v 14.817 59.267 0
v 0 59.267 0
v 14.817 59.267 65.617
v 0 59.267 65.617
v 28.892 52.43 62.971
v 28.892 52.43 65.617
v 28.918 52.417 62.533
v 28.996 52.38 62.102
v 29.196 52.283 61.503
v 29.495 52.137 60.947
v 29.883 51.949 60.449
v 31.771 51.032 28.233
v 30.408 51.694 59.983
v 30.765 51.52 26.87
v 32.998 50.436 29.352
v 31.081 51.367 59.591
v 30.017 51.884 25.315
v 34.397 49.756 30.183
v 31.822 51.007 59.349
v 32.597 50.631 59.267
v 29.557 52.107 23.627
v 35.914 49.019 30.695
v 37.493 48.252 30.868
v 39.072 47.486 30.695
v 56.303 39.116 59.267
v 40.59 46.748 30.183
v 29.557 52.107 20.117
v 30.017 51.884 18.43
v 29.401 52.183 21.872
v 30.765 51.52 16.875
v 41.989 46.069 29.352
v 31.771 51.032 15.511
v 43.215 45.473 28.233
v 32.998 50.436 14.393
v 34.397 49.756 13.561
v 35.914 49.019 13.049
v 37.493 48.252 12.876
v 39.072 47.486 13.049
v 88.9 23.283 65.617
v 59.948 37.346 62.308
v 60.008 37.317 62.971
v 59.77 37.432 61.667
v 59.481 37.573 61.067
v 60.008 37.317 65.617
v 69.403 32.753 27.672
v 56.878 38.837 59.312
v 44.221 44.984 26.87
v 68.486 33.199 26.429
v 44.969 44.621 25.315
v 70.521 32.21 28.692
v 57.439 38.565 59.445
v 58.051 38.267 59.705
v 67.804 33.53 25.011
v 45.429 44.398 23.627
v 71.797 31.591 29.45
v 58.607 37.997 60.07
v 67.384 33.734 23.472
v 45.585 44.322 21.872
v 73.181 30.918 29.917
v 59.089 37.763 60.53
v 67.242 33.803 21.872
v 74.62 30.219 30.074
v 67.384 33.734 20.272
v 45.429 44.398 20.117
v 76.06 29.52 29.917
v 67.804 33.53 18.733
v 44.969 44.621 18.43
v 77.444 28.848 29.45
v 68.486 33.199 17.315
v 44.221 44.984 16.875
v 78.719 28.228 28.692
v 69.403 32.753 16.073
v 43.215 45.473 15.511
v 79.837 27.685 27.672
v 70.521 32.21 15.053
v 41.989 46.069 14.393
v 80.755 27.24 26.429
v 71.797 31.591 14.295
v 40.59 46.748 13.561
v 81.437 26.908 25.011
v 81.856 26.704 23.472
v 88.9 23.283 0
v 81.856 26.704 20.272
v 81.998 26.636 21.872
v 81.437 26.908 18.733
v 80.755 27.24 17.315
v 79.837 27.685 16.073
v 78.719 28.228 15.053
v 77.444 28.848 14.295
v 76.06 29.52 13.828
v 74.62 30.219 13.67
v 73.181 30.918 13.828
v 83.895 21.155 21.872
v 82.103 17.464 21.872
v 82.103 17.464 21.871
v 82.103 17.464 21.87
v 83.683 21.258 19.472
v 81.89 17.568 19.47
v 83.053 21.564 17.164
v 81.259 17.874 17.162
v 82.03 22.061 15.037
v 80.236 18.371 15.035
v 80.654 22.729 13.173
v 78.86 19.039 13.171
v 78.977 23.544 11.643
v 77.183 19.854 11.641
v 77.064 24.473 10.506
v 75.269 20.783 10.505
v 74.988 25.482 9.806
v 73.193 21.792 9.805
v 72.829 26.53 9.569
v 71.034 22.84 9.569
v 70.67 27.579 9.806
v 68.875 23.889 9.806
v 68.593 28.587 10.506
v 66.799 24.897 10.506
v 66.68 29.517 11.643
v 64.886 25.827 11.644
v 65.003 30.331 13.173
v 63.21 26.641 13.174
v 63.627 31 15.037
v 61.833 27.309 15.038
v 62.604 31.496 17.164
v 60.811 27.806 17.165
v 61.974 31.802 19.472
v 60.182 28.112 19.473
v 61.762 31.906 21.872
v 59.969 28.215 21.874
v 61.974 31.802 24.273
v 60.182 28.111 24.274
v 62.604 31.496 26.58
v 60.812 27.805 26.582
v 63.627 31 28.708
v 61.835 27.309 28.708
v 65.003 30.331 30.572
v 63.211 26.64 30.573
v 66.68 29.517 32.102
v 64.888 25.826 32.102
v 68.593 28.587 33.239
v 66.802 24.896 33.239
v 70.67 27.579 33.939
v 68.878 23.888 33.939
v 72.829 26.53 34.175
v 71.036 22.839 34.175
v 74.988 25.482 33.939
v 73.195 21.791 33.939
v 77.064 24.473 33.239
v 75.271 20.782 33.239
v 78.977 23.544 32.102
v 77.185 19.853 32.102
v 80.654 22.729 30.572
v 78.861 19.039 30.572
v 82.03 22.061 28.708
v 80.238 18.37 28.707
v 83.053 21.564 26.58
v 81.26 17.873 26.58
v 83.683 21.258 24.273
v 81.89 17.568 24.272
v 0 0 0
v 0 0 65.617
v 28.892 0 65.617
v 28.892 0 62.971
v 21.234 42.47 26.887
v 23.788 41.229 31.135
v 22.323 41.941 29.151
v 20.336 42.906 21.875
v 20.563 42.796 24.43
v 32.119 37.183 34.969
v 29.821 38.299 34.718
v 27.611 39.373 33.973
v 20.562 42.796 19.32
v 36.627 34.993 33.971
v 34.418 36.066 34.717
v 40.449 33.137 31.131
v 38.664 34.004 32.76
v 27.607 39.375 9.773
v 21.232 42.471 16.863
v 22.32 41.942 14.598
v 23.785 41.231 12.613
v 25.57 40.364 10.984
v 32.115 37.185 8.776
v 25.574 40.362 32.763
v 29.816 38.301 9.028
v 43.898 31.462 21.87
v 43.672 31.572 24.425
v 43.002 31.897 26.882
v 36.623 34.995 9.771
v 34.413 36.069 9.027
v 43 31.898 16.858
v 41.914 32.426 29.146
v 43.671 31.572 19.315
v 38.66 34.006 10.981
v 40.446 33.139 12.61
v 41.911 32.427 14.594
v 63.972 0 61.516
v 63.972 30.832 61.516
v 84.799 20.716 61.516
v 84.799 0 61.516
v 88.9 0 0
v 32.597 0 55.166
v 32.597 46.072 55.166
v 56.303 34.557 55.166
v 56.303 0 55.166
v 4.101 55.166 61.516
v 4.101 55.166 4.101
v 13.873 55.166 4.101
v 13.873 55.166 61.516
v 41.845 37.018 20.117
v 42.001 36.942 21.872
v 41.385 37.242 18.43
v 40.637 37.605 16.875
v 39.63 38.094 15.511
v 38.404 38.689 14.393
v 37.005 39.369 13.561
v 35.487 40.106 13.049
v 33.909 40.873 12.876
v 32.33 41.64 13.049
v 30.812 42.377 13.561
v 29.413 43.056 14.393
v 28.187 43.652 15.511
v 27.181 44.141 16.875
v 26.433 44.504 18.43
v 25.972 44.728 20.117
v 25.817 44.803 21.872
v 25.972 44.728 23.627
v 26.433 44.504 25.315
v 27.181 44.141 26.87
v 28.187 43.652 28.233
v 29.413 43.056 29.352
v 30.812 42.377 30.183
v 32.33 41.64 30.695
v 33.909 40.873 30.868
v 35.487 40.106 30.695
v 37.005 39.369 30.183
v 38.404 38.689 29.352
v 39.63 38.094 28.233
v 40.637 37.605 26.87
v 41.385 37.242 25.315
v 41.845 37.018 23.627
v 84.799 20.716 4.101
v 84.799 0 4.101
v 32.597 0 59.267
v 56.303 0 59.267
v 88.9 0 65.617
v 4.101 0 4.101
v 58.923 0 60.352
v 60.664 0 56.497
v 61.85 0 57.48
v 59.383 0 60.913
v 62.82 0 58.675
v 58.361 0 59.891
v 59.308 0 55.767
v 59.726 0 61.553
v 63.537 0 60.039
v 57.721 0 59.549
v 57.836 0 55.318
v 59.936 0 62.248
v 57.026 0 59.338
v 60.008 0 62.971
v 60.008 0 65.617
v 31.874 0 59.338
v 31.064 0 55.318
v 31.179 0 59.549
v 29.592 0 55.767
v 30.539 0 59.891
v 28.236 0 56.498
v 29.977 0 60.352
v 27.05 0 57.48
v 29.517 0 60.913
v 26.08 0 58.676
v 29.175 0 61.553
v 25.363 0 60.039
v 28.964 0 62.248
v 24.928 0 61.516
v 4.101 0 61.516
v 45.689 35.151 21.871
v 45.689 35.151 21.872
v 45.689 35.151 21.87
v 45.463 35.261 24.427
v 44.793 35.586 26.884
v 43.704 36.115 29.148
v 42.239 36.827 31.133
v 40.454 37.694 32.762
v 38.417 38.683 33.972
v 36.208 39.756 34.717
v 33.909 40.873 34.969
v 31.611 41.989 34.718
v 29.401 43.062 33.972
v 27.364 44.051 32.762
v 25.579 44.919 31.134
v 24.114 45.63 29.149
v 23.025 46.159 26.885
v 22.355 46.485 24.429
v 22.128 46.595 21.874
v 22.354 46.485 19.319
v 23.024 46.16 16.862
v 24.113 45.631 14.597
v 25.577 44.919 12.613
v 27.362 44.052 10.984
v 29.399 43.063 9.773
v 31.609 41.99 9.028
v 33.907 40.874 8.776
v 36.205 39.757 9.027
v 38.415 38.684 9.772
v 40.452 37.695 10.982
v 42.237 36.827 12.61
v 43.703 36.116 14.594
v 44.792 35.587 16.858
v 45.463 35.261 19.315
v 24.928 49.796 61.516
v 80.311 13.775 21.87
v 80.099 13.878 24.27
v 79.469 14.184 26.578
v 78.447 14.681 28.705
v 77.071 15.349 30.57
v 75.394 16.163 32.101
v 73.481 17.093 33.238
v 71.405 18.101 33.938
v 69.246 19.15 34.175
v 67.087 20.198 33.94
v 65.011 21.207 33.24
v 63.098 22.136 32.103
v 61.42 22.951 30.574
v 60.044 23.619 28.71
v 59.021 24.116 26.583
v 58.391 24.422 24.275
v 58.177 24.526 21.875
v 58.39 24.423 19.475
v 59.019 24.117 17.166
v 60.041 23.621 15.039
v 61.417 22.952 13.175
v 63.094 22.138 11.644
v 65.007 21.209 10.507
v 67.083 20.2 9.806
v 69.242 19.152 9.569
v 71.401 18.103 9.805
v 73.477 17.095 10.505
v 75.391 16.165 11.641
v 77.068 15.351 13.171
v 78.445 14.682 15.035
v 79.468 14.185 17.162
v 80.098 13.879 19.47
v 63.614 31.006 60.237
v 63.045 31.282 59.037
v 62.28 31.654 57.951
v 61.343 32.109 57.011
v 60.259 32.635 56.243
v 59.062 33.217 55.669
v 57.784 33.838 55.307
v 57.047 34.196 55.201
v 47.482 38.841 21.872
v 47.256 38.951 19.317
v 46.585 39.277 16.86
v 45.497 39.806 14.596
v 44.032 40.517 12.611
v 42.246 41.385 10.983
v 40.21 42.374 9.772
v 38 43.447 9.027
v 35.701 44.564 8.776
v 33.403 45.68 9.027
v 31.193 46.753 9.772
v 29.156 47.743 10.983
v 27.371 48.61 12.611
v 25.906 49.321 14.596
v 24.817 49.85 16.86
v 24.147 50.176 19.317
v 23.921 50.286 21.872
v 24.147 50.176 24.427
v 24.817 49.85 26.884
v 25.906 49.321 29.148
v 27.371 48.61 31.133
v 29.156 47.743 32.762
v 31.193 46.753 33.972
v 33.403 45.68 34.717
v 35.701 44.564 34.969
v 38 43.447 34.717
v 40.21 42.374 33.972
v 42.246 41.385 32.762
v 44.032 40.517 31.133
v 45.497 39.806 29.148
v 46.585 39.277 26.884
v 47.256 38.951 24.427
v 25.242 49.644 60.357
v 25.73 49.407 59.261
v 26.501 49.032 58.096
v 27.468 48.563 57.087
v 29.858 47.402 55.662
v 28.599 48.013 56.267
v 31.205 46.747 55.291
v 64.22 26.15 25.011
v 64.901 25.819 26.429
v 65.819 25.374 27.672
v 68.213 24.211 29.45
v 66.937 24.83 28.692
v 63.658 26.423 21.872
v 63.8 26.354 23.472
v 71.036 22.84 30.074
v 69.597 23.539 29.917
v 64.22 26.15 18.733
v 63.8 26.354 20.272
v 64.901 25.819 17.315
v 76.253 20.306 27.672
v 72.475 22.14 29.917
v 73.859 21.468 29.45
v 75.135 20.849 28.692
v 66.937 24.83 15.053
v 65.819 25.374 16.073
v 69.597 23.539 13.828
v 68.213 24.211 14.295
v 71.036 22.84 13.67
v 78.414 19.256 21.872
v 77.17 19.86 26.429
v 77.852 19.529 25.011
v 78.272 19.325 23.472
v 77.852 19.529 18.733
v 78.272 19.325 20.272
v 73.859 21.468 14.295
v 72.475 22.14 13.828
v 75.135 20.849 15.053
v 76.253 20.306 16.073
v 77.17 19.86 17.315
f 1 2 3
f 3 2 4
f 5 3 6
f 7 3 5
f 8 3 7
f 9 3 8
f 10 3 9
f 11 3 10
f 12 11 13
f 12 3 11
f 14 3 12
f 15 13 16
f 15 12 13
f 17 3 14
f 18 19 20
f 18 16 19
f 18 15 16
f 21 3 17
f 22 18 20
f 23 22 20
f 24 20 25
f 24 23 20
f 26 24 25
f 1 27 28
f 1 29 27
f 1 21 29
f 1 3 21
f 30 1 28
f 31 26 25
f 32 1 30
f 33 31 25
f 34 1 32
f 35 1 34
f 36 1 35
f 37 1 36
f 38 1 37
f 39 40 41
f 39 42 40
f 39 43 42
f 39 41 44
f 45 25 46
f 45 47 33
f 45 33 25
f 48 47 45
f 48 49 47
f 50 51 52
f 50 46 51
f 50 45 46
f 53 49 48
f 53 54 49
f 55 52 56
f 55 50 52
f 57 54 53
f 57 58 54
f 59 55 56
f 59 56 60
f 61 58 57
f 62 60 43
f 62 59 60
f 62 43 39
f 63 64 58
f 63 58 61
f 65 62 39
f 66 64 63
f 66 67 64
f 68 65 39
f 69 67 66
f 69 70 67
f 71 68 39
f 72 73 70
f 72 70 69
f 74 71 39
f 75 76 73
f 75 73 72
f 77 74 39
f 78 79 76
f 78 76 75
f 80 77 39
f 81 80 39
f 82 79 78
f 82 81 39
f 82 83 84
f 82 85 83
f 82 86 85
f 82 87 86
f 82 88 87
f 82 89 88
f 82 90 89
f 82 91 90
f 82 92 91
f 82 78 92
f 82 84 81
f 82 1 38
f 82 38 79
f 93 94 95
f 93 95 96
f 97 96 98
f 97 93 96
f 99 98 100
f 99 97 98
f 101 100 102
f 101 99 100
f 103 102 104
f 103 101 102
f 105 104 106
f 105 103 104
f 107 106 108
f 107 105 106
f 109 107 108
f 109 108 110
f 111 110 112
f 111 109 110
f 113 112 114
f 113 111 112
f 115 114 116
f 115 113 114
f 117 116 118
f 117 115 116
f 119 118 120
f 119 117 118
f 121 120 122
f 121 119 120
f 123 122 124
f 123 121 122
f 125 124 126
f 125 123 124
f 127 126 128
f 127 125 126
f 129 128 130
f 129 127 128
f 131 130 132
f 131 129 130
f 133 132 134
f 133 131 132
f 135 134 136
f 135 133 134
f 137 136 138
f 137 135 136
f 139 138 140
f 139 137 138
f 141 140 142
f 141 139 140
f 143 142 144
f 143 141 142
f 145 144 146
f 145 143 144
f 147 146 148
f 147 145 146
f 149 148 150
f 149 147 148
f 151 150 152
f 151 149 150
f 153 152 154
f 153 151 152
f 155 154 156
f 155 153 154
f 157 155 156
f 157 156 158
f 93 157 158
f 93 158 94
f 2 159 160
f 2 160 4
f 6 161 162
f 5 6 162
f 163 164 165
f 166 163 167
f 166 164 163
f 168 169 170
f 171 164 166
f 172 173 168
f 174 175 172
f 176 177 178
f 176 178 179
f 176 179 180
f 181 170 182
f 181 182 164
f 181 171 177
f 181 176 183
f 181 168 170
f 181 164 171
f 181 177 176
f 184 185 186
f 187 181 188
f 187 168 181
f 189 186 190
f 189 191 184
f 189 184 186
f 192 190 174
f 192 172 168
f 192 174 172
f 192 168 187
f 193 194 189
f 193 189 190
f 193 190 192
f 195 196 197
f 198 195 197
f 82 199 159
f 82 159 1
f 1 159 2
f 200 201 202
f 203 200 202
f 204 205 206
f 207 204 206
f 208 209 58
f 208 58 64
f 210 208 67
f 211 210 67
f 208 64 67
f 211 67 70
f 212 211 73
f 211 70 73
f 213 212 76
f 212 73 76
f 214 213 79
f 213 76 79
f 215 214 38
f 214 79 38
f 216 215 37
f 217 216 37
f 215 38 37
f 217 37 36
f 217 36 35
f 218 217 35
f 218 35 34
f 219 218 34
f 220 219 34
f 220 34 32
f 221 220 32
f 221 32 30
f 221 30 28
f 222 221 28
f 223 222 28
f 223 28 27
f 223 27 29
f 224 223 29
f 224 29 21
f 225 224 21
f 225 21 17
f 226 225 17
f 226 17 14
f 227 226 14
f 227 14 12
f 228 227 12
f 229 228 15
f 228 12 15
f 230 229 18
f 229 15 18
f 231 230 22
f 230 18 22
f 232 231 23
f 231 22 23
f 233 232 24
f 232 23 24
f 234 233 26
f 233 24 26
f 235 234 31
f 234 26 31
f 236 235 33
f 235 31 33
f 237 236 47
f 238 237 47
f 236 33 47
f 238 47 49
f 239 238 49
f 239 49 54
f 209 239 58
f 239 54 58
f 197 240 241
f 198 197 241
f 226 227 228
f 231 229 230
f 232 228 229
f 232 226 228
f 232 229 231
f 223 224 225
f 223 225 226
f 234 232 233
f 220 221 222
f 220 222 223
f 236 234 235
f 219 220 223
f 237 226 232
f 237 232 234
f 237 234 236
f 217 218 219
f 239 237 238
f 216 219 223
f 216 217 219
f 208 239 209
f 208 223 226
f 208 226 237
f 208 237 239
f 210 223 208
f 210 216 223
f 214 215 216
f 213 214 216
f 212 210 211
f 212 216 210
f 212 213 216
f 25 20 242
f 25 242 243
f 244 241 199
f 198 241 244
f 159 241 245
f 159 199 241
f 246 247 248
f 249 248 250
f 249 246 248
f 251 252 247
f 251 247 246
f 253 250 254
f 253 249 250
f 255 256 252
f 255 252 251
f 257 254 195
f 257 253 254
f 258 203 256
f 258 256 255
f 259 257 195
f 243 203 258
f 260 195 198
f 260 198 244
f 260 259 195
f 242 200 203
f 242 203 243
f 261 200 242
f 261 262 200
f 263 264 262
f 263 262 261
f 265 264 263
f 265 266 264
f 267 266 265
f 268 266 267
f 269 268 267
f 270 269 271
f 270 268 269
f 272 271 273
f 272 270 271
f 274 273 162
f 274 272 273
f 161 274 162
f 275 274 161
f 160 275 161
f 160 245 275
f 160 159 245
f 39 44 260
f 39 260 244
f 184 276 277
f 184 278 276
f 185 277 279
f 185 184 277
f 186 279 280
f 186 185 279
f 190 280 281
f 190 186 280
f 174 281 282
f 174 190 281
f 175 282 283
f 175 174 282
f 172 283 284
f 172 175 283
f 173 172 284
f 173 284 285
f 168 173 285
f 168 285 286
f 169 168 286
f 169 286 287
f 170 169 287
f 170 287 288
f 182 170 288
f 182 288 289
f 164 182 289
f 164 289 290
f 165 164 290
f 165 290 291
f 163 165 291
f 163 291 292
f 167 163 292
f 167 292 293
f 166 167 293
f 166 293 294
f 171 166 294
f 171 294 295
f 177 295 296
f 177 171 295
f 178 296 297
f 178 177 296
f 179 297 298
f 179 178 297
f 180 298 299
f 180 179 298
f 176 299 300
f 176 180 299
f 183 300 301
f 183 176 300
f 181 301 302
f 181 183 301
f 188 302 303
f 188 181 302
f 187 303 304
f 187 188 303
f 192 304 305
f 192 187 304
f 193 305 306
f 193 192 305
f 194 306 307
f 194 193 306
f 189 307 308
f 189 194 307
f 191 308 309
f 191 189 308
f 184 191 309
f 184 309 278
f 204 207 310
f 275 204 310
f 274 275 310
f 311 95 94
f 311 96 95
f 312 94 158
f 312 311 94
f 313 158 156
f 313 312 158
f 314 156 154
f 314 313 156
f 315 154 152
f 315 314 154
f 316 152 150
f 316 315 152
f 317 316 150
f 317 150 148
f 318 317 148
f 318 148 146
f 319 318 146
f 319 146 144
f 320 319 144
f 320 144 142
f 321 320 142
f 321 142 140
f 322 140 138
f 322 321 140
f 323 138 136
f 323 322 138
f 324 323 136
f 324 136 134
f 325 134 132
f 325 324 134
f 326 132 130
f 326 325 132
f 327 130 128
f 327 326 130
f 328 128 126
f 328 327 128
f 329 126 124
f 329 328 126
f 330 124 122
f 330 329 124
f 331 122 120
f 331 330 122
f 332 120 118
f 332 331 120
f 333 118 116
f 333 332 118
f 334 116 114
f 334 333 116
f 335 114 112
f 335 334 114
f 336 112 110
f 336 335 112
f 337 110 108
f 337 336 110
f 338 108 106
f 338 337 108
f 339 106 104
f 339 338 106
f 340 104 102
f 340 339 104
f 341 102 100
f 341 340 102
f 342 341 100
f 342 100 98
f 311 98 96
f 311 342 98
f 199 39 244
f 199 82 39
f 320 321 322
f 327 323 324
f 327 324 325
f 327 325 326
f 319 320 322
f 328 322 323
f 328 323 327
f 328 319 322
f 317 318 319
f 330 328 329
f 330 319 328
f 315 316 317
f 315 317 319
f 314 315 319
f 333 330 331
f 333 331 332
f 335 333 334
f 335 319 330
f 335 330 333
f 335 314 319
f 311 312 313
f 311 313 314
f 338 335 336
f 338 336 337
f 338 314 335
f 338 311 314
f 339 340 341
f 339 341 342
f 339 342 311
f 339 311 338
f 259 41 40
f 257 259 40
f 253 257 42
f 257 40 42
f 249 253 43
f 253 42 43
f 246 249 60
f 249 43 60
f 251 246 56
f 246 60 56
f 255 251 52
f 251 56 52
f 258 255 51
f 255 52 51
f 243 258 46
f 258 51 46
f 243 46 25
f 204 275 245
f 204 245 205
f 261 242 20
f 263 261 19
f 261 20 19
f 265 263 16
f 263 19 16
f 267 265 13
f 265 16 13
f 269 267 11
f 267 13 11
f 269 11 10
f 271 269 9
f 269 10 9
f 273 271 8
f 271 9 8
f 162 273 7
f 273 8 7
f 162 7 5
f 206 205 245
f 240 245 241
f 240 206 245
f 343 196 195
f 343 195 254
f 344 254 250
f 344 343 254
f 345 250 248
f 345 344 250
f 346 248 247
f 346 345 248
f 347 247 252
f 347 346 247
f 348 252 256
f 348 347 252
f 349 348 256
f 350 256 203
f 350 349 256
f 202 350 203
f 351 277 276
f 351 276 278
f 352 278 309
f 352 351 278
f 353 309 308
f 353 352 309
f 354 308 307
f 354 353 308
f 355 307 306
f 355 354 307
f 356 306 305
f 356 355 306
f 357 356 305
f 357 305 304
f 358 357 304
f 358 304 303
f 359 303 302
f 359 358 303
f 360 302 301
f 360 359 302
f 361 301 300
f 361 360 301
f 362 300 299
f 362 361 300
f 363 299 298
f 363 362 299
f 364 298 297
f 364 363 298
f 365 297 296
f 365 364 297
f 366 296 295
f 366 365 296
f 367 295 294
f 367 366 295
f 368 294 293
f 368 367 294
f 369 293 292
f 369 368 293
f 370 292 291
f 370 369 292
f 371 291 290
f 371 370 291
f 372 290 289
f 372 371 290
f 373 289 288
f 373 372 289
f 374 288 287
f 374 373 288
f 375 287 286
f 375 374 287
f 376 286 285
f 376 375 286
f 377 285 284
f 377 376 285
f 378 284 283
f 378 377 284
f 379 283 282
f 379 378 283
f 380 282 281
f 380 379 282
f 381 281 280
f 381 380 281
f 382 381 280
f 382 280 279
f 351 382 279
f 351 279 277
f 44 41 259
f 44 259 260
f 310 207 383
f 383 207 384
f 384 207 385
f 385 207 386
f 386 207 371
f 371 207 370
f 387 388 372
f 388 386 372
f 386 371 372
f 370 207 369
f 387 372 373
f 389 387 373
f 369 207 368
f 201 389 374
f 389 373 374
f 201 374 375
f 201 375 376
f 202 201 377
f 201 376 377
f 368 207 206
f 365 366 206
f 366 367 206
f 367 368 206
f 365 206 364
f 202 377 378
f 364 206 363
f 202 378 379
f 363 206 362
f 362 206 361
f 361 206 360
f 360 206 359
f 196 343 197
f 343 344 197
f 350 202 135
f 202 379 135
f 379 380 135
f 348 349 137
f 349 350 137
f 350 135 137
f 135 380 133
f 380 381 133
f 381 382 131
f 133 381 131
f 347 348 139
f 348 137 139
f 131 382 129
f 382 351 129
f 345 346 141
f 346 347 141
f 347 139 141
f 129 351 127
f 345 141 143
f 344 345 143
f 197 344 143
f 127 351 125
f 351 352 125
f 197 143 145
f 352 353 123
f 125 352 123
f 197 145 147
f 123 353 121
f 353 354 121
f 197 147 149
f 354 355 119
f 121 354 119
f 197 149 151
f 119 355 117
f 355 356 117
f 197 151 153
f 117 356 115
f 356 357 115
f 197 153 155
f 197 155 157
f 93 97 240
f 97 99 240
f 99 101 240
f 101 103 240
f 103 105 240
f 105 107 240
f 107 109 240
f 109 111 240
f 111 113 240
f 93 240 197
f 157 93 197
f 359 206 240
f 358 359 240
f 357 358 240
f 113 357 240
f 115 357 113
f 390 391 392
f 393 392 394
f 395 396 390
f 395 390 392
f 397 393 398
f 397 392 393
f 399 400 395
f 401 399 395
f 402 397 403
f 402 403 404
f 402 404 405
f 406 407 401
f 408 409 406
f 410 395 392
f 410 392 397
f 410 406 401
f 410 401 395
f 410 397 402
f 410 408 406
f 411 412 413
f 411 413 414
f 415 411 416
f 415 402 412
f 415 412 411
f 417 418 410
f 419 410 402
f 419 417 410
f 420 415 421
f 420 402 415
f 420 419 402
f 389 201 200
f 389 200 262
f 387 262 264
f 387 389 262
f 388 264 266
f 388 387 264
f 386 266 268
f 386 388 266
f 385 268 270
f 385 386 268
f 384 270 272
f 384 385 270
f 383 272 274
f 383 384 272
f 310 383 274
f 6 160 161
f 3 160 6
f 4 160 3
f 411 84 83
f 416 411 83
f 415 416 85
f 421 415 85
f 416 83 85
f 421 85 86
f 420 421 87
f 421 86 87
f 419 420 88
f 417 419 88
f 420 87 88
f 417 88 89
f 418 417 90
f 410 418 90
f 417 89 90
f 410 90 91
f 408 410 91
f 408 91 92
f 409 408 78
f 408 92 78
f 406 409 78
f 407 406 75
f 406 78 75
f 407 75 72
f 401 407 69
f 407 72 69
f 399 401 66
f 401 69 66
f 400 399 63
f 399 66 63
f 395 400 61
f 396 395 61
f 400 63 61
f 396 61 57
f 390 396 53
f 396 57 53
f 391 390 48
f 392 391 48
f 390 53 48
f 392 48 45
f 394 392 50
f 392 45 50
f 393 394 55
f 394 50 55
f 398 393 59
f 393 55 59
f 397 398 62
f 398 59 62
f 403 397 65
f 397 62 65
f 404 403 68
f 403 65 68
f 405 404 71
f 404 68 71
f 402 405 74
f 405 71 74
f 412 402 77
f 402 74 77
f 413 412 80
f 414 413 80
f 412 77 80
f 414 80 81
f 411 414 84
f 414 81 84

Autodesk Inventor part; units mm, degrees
ref_plane "YZ Plane" through (0, 0, 0) normal (1, 0, 0) x (0, 1, 0)
ref_plane "XZ Plane" through (0, 0, 0) normal (0, 1, 0) x (-1, 0, 0)
ref_plane "XY Plane" through (0, 0, 0) normal (0, 0, 1) x (1, 0, 0)
sketch "Sketch1" plane through (0, 0, 0) normal (0, 0, 1) x (1, 0, 0)
  line L0 (0, 0) -> (0, 59.2667)
  line L1 (0, 59.2667) -> (14.8167, 59.2667)
  line L2 (14.8167, 59.2667) -> (88.9, 23.2833)
  line L3 (88.9, 23.2833) -> (88.9, 0)
  line L4 (88.9, 0) -> (0, 0)
  dimension "OverallHeight" = 59.2667
  dimension "TopWidth" = 14.8167
  dimension "RightHeight" = 23.2833
  dimension "OverallWidth" = 88.9
extrude "Extrusion1" add sketch "Sketch1" along normal blind 65.6167
sketch "Sketch2" plane through (14.8167, 59.2667, 65.6167) normal (0.436904, 0.8995082, 0) x (0.8995082, -0.436904, 0)
  circle A0 centre (25.2098, 43.7444) radius 8.9958
  circle A1 centre (66.4848, 43.7444) radius 8.2021
  line L0 (0, 65.6167) -> (82.3598, 65.6167) projected
  line L1 (82.3598, 65.6167) -> (82.3598, 0) projected
  point P0 (12.5661, 65.6167)
  dimension "UpperHoleDiameter" = 17.9917
  dimension "LowerHoleDiameter" = 16.4042
  dimension "EdgeDistance" = 15.875
  dimension "HoleAllignment" = 0
  dimension "HoleToCenter" = 41.275
  dimension "BackEdgeToHoleCenters" = 21.8722
extrude "Extrusion2" cut sketch "Sketch2" against normal blind 8.2021
sketch "Sketch3" plane through (14.8167, 59.2667, 65.6167) normal (0.436904, 0.8995082, 0) x (0.8995082, -0.436904, 0)
  line L0 (82.3598, 0) -> (0, 0) projected
  line L1 (22.3523, 0) -> (53.4673, 0)
  line L2 (26.0565, 6.35) -> (49.7632, 6.35)
  line L3 (22.3523, 0) -> (22.3523, 2.6458)
  line L4 (53.4673, 2.6458) -> (53.4673, 0)
  line L5 (82.3598, 65.6167) -> (82.3598, 0) projected
  arc A0 (26.0565, 6.35) -> (22.3523, 2.6458) centre (26.0565, 2.6458) ccw
  arc A1 (53.4673, 2.6458) -> (49.7632, 6.35) centre (49.7632, 2.6458) ccw
  point P0 (12.5661, 65.6167)
  dimension "NotchWidth" = 31.115
  dimension "NotchDepth" = 6.35
  dimension "NotchLocation" = 28.8925
  dimension "d18" = 3.7042
sketch "Sketch4" plane through (0, 59.2667, 0) normal (0, 1, 0) x (1, 0, 0)
  line L0 (88.9, -65.6167) -> (0, -65.6167)
  line L1 (28.8925, -65.6167) -> (60.0075, -65.6167)
  line L2 (32.5967, -59.2667) -> (56.3033, -59.2667)
  line L3 (28.8925, -65.6167) -> (28.8925, -62.9708)
  line L4 (60.0075, -62.9708) -> (60.0075, -65.6167)
  line L5 (88.9, 57.15) -> (88.9, -65.6167)
  arc A0 (32.5967, -59.2667) -> (28.8925, -62.9708) centre (32.5967, -62.9708) ccw
  arc A1 (60.0075, -62.9708) -> (56.3033, -59.2667) centre (56.3033, -62.9708) ccw
  line L6 (14.8167, -65.6167) -> (0, -65.6167) projected
  line L7 (88.9, 0) -> (88.9, -65.6167) projected
  point P0 (0, 0)
  point P1 (11.3592, 57.15)
  dimension "d19" = 31.115
  dimension "d20" = 6.35
  dimension "d21" = 28.8925
  dimension "d22" = 3.7042
  dimension "d26" = 0
  dimension "d27" = 0
extrude "Extrusion3" cut sketch "Sketch4" against normal through all
shell "Shell1" thickness 4.101 removed faces 1 at (40.4989, 0, 19.7556)
equation "\"OverallWidth\" = 1.5 * OverallHeight"
equation "\"BackEdgeToHoleCenters\" = 0.333333 * Depth"
equation "\"HoleDepth\" = 0.5 * LowerHoleDiameter"
equation "\"NotchWidth\" = 0.35 * OverallWidth"
equation "\"NotchLocation\" = 0.5 * OverallWidth - 0.5 * NotchWidth"
equation "\"d18\" = 0.25 * TopWidth"
equation "\"d19\" = 0.35 * OverallWidth"
equation "\"d21\" = 0.5 * OverallWidth - 0.5 * d19"
equation "\"d22\" = 0.25 * TopWidth"
equation "\"d28\" = 0.5 * LowerHoleDiameter"
equation "\"ShellThickness\" = 0.5 * HoleDepth"
equation "\"d23\" = 1.5 * OverallHeight"
equation "\"d24\" = TopWidth"
equation "\"d25\" = OverallHeight"
equation "\"Depth\" = 65.616667"
properties part number "8.2 Q2" material "Aluminum 6061"
